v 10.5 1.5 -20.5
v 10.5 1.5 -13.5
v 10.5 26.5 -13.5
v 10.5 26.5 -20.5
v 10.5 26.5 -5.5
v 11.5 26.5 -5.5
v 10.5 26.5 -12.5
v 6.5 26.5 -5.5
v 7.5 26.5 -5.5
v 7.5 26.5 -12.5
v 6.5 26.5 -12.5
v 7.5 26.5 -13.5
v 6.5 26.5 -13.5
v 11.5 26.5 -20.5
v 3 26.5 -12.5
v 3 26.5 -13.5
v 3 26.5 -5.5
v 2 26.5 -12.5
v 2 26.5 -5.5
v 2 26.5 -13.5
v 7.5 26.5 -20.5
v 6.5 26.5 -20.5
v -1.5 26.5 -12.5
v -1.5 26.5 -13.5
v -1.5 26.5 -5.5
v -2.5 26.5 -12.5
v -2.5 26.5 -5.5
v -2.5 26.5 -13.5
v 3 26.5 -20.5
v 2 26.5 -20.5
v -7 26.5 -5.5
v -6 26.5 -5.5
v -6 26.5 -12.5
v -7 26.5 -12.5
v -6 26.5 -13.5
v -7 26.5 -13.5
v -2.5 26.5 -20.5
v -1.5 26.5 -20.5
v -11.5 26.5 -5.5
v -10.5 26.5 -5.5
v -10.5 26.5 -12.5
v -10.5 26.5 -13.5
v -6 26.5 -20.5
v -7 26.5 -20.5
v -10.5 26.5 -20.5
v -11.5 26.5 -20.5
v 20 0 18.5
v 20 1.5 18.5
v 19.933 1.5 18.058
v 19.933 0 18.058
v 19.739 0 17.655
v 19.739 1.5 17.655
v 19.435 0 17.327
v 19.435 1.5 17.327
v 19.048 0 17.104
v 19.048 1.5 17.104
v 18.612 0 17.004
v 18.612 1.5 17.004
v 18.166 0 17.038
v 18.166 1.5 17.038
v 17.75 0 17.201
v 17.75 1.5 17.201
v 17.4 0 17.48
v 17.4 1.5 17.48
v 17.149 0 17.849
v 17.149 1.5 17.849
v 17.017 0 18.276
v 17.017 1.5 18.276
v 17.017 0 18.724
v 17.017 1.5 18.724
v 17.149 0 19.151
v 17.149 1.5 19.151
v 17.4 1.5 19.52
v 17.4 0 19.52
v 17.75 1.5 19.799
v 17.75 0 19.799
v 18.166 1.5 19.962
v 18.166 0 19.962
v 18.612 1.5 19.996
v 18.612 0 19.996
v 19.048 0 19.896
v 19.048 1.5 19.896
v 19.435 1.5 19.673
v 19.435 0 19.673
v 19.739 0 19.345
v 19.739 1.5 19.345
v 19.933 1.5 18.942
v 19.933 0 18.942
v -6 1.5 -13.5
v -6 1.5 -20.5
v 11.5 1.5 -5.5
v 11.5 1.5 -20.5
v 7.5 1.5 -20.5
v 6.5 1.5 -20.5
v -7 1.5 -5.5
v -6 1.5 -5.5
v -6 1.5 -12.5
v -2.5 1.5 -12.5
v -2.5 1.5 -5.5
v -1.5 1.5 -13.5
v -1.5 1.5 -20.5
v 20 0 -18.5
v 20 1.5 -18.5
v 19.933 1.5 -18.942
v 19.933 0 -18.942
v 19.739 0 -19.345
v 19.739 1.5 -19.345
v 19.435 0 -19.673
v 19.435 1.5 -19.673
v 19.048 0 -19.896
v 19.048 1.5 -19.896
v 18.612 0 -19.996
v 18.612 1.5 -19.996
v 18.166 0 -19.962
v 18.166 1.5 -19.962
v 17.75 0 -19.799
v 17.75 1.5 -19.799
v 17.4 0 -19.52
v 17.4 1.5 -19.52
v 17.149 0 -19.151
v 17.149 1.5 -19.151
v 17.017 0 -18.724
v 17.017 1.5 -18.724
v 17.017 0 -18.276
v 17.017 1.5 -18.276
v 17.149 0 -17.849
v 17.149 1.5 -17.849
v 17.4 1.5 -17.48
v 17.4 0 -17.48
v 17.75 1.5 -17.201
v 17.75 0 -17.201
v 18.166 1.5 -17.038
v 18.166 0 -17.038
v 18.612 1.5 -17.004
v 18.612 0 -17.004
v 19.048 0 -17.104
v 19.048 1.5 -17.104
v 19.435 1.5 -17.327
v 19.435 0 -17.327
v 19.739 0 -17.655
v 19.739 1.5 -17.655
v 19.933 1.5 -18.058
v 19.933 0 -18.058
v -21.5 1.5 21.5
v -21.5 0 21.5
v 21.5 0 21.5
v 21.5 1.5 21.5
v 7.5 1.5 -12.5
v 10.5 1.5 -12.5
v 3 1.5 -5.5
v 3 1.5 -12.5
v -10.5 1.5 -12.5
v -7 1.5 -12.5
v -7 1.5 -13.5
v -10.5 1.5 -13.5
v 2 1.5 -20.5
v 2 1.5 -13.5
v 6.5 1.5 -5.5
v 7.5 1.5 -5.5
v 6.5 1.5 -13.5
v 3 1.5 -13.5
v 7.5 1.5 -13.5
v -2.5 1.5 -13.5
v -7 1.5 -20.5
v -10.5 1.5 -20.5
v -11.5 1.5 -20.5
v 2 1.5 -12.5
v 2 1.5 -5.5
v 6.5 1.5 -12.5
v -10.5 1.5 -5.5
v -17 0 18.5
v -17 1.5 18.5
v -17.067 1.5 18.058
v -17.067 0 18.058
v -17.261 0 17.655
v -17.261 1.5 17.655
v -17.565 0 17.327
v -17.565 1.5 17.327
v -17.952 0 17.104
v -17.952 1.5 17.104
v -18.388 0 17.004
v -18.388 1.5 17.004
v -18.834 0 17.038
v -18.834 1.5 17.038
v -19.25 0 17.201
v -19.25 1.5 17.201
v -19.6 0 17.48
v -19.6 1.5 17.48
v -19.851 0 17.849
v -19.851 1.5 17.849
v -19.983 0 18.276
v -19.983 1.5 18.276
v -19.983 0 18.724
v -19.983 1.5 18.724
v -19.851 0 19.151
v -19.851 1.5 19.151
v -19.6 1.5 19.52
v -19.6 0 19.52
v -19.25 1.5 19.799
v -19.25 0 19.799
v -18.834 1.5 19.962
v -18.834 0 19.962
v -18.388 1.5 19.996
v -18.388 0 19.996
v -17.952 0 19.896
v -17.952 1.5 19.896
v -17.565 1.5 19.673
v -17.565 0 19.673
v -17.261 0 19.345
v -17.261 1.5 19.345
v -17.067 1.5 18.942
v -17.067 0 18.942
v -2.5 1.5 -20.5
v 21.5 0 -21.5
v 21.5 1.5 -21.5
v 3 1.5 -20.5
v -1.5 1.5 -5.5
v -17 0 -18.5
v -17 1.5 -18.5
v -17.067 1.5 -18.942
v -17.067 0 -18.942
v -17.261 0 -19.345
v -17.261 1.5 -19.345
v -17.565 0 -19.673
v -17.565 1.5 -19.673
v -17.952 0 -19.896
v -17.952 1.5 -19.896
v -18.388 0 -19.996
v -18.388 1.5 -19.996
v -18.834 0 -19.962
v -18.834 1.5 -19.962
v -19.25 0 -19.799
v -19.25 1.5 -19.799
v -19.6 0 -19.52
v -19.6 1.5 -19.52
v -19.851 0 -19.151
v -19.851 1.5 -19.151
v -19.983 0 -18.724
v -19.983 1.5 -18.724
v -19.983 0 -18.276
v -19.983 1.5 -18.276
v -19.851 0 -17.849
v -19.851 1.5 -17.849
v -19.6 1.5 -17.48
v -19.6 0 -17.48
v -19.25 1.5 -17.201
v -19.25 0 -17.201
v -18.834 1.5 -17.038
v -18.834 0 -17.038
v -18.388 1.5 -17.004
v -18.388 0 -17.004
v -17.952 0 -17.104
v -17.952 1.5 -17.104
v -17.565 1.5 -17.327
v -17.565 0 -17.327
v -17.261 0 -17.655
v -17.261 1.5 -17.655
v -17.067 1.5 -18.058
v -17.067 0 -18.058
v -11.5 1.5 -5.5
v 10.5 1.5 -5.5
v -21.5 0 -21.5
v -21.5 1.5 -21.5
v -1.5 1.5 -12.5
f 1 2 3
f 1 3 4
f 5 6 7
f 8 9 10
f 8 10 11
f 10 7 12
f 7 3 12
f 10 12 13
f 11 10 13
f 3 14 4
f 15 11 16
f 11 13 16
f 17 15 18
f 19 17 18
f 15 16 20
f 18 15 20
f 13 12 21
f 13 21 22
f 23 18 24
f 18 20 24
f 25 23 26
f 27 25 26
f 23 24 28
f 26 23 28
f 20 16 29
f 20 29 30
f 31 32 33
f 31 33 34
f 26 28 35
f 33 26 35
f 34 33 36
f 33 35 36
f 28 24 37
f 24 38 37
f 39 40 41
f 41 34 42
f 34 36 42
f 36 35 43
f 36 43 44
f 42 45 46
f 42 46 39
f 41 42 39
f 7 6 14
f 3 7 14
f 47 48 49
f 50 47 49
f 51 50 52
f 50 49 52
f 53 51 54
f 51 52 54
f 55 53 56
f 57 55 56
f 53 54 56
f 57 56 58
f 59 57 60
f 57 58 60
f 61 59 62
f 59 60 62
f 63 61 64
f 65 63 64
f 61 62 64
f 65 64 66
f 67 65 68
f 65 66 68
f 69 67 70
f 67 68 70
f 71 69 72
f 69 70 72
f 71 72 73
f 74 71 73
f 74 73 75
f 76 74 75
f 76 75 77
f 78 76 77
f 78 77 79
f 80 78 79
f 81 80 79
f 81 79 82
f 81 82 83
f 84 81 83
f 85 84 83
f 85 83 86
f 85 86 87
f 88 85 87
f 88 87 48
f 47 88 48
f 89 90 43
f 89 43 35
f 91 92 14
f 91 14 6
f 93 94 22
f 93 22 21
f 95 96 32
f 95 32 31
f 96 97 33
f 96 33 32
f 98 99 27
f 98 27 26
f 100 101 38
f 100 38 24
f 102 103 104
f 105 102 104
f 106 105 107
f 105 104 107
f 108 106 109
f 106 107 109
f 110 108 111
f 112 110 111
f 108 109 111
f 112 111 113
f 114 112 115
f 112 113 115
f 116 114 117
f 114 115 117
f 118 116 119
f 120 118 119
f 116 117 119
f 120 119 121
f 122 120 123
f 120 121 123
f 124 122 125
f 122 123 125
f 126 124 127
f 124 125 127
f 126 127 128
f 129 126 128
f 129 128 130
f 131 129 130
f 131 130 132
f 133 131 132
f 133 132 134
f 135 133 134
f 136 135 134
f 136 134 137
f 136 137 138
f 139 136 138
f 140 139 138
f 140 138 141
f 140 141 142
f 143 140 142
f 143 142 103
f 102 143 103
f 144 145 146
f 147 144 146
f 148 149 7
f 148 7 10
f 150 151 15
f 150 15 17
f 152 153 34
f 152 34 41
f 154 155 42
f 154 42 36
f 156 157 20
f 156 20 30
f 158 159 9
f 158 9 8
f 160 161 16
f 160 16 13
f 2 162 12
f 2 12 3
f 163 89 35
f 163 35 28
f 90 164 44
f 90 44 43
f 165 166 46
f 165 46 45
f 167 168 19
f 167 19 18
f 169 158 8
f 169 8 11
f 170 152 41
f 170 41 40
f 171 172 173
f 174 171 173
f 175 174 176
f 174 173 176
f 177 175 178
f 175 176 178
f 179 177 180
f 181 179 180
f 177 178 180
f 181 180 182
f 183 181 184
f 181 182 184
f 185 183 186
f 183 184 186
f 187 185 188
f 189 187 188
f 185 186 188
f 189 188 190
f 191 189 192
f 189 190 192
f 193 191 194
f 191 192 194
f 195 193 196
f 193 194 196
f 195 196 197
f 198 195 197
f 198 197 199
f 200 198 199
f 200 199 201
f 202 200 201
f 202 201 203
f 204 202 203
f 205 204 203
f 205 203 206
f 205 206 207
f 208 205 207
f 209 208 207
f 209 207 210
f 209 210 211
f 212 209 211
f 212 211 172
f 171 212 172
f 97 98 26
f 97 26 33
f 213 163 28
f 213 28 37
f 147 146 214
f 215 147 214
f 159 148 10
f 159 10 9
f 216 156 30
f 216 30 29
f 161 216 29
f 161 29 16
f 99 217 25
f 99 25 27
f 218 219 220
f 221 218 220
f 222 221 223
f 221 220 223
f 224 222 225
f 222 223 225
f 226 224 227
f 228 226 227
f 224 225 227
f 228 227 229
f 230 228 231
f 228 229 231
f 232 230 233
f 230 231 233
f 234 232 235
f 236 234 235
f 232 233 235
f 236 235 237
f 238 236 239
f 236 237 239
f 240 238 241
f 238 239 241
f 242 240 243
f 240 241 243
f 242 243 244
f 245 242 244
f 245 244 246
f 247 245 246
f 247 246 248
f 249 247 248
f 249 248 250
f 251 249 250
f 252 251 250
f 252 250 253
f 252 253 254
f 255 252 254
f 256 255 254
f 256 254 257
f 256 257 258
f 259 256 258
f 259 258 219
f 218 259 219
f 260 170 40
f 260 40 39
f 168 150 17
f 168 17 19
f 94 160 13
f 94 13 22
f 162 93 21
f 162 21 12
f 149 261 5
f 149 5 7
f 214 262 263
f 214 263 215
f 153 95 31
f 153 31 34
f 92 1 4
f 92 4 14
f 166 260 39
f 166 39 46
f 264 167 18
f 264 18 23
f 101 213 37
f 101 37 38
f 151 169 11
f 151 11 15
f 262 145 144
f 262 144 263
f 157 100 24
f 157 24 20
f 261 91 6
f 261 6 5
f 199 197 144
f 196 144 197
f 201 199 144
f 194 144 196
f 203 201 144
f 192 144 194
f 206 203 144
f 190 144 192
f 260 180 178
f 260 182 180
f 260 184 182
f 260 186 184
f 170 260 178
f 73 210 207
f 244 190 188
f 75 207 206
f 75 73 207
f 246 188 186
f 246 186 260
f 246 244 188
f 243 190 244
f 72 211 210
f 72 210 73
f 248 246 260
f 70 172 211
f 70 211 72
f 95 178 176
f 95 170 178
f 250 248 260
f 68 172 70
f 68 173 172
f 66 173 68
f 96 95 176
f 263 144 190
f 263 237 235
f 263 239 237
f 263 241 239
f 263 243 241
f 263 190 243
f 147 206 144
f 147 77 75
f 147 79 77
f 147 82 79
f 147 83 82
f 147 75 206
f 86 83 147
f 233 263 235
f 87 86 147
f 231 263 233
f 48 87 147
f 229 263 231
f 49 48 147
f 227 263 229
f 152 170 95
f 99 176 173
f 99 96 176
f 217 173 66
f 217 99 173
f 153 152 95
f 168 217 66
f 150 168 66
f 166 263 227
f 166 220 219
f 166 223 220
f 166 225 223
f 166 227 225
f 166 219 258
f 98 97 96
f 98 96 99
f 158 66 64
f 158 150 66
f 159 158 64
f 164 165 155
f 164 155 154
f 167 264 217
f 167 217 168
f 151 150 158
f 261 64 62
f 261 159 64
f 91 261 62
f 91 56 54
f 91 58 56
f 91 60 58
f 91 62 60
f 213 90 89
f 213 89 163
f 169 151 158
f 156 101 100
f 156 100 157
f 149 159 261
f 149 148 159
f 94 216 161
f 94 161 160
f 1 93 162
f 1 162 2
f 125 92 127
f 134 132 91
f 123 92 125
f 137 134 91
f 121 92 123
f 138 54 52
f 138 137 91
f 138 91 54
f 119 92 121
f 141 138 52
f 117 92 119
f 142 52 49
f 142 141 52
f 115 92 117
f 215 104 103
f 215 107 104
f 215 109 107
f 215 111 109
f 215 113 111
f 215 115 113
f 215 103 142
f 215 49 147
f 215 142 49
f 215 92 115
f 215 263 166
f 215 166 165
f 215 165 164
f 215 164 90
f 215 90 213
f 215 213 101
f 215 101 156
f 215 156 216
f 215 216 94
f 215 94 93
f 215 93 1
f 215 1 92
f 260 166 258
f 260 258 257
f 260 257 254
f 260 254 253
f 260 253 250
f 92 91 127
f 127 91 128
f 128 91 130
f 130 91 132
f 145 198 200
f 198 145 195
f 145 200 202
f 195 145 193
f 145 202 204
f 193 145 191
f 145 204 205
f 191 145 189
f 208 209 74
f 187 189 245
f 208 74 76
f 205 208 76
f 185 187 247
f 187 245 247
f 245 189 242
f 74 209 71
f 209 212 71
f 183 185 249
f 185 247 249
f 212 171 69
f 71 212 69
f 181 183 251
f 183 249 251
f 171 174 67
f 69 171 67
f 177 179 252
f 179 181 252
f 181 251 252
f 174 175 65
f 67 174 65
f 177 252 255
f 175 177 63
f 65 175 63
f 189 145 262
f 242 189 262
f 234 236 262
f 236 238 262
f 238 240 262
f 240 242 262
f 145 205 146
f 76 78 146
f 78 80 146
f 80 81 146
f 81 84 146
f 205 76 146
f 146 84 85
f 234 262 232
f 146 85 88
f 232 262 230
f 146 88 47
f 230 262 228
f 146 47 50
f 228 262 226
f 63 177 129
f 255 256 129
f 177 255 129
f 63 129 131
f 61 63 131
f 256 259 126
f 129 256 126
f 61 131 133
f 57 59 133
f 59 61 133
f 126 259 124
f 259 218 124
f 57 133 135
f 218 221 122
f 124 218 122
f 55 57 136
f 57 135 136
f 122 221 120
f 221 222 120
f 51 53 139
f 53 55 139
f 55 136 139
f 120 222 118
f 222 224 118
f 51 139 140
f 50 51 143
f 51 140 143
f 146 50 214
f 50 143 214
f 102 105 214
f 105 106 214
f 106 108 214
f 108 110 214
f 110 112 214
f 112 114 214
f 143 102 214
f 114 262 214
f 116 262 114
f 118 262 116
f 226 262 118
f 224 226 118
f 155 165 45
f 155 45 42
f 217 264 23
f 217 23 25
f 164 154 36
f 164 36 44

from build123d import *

# Parameters (mm, degrees)
SKETCH1_W           = 43
SKETCH1_H           = 43
BOSS_EXTRUDE1_DEPTH = 1.5
SKETCH2_R           = 1.5
CUT_EXTRUDE1_DEPTH  = 2.5
BOSS_EXTRUDE2_DEPTH = 25


with BuildPart() as part:
    # Sketch1 → Boss-Extrude1 (new body)
    with BuildSketch(Plane(origin=(0, 0, 0), x_dir=(1, 0, 0), z_dir=(0, 1, 0))):
        Rectangle(SKETCH1_W, SKETCH1_H)
    extrude(amount=BOSS_EXTRUDE1_DEPTH)

    # Sketch2 → Cut-Extrude1 (cut, through all)
    with BuildSketch(Plane(origin=(0, 1.5, 0), x_dir=(1, 0, 0), z_dir=(0, 1, 0))):
        with Locations((-18.5, 18.5)):
            Circle(SKETCH2_R)
        with Locations((18.5, 18.5)):
            Circle(SKETCH2_R)
        with Locations((18.5, -18.5)):
            Circle(SKETCH2_R)
        with Locations((-18.5, -18.5)):
            Circle(SKETCH2_R)
    extrude(amount=-CUT_EXTRUDE1_DEPTH, mode=Mode.SUBTRACT)

    # Sketch3 → Boss-Extrude2 (add)
    with BuildSketch(Plane(origin=(0, 1.5, 0), x_dir=(1, 0, 0), z_dir=(0, 1, 0))):
        Polygon((-7, 5.5), (-7, 12.5), (-10.5, 12.5), (-10.5, 5.5), (-11.5, 5.5), (-11.5, 20.5), (-10.5, 20.5), (-10.5, 13.5), (-7, 13.5), (-7, 20.5), (-6, 20.5), (-6, 13.5), (-2.5, 13.5), (-2.5, 20.5), (-1.5, 20.5), (-1.5, 13.5), (2, 13.5), (2, 20.5), (3, 20.5), (3, 13.5), (6.5, 13.5), (6.5, 20.5), (7.5, 20.5), (7.5, 13.5), (10.5, 13.5), (10.5, 20.5), (11.5, 20.5), (11.5, 5.5), (10.5, 5.5), (10.5, 12.5), (7.5, 12.5), (7.5, 5.5), (6.5, 5.5), (6.5, 12.5), (3, 12.5), (3, 5.5), (2, 5.5), (2, 12.5), (-1.5, 12.5), (-1.5, 5.5), (-2.5, 5.5), (-2.5, 12.5), (-6, 12.5), (-6, 5.5), align=None)
    extrude(amount=BOSS_EXTRUDE2_DEPTH)


solid = part.part
